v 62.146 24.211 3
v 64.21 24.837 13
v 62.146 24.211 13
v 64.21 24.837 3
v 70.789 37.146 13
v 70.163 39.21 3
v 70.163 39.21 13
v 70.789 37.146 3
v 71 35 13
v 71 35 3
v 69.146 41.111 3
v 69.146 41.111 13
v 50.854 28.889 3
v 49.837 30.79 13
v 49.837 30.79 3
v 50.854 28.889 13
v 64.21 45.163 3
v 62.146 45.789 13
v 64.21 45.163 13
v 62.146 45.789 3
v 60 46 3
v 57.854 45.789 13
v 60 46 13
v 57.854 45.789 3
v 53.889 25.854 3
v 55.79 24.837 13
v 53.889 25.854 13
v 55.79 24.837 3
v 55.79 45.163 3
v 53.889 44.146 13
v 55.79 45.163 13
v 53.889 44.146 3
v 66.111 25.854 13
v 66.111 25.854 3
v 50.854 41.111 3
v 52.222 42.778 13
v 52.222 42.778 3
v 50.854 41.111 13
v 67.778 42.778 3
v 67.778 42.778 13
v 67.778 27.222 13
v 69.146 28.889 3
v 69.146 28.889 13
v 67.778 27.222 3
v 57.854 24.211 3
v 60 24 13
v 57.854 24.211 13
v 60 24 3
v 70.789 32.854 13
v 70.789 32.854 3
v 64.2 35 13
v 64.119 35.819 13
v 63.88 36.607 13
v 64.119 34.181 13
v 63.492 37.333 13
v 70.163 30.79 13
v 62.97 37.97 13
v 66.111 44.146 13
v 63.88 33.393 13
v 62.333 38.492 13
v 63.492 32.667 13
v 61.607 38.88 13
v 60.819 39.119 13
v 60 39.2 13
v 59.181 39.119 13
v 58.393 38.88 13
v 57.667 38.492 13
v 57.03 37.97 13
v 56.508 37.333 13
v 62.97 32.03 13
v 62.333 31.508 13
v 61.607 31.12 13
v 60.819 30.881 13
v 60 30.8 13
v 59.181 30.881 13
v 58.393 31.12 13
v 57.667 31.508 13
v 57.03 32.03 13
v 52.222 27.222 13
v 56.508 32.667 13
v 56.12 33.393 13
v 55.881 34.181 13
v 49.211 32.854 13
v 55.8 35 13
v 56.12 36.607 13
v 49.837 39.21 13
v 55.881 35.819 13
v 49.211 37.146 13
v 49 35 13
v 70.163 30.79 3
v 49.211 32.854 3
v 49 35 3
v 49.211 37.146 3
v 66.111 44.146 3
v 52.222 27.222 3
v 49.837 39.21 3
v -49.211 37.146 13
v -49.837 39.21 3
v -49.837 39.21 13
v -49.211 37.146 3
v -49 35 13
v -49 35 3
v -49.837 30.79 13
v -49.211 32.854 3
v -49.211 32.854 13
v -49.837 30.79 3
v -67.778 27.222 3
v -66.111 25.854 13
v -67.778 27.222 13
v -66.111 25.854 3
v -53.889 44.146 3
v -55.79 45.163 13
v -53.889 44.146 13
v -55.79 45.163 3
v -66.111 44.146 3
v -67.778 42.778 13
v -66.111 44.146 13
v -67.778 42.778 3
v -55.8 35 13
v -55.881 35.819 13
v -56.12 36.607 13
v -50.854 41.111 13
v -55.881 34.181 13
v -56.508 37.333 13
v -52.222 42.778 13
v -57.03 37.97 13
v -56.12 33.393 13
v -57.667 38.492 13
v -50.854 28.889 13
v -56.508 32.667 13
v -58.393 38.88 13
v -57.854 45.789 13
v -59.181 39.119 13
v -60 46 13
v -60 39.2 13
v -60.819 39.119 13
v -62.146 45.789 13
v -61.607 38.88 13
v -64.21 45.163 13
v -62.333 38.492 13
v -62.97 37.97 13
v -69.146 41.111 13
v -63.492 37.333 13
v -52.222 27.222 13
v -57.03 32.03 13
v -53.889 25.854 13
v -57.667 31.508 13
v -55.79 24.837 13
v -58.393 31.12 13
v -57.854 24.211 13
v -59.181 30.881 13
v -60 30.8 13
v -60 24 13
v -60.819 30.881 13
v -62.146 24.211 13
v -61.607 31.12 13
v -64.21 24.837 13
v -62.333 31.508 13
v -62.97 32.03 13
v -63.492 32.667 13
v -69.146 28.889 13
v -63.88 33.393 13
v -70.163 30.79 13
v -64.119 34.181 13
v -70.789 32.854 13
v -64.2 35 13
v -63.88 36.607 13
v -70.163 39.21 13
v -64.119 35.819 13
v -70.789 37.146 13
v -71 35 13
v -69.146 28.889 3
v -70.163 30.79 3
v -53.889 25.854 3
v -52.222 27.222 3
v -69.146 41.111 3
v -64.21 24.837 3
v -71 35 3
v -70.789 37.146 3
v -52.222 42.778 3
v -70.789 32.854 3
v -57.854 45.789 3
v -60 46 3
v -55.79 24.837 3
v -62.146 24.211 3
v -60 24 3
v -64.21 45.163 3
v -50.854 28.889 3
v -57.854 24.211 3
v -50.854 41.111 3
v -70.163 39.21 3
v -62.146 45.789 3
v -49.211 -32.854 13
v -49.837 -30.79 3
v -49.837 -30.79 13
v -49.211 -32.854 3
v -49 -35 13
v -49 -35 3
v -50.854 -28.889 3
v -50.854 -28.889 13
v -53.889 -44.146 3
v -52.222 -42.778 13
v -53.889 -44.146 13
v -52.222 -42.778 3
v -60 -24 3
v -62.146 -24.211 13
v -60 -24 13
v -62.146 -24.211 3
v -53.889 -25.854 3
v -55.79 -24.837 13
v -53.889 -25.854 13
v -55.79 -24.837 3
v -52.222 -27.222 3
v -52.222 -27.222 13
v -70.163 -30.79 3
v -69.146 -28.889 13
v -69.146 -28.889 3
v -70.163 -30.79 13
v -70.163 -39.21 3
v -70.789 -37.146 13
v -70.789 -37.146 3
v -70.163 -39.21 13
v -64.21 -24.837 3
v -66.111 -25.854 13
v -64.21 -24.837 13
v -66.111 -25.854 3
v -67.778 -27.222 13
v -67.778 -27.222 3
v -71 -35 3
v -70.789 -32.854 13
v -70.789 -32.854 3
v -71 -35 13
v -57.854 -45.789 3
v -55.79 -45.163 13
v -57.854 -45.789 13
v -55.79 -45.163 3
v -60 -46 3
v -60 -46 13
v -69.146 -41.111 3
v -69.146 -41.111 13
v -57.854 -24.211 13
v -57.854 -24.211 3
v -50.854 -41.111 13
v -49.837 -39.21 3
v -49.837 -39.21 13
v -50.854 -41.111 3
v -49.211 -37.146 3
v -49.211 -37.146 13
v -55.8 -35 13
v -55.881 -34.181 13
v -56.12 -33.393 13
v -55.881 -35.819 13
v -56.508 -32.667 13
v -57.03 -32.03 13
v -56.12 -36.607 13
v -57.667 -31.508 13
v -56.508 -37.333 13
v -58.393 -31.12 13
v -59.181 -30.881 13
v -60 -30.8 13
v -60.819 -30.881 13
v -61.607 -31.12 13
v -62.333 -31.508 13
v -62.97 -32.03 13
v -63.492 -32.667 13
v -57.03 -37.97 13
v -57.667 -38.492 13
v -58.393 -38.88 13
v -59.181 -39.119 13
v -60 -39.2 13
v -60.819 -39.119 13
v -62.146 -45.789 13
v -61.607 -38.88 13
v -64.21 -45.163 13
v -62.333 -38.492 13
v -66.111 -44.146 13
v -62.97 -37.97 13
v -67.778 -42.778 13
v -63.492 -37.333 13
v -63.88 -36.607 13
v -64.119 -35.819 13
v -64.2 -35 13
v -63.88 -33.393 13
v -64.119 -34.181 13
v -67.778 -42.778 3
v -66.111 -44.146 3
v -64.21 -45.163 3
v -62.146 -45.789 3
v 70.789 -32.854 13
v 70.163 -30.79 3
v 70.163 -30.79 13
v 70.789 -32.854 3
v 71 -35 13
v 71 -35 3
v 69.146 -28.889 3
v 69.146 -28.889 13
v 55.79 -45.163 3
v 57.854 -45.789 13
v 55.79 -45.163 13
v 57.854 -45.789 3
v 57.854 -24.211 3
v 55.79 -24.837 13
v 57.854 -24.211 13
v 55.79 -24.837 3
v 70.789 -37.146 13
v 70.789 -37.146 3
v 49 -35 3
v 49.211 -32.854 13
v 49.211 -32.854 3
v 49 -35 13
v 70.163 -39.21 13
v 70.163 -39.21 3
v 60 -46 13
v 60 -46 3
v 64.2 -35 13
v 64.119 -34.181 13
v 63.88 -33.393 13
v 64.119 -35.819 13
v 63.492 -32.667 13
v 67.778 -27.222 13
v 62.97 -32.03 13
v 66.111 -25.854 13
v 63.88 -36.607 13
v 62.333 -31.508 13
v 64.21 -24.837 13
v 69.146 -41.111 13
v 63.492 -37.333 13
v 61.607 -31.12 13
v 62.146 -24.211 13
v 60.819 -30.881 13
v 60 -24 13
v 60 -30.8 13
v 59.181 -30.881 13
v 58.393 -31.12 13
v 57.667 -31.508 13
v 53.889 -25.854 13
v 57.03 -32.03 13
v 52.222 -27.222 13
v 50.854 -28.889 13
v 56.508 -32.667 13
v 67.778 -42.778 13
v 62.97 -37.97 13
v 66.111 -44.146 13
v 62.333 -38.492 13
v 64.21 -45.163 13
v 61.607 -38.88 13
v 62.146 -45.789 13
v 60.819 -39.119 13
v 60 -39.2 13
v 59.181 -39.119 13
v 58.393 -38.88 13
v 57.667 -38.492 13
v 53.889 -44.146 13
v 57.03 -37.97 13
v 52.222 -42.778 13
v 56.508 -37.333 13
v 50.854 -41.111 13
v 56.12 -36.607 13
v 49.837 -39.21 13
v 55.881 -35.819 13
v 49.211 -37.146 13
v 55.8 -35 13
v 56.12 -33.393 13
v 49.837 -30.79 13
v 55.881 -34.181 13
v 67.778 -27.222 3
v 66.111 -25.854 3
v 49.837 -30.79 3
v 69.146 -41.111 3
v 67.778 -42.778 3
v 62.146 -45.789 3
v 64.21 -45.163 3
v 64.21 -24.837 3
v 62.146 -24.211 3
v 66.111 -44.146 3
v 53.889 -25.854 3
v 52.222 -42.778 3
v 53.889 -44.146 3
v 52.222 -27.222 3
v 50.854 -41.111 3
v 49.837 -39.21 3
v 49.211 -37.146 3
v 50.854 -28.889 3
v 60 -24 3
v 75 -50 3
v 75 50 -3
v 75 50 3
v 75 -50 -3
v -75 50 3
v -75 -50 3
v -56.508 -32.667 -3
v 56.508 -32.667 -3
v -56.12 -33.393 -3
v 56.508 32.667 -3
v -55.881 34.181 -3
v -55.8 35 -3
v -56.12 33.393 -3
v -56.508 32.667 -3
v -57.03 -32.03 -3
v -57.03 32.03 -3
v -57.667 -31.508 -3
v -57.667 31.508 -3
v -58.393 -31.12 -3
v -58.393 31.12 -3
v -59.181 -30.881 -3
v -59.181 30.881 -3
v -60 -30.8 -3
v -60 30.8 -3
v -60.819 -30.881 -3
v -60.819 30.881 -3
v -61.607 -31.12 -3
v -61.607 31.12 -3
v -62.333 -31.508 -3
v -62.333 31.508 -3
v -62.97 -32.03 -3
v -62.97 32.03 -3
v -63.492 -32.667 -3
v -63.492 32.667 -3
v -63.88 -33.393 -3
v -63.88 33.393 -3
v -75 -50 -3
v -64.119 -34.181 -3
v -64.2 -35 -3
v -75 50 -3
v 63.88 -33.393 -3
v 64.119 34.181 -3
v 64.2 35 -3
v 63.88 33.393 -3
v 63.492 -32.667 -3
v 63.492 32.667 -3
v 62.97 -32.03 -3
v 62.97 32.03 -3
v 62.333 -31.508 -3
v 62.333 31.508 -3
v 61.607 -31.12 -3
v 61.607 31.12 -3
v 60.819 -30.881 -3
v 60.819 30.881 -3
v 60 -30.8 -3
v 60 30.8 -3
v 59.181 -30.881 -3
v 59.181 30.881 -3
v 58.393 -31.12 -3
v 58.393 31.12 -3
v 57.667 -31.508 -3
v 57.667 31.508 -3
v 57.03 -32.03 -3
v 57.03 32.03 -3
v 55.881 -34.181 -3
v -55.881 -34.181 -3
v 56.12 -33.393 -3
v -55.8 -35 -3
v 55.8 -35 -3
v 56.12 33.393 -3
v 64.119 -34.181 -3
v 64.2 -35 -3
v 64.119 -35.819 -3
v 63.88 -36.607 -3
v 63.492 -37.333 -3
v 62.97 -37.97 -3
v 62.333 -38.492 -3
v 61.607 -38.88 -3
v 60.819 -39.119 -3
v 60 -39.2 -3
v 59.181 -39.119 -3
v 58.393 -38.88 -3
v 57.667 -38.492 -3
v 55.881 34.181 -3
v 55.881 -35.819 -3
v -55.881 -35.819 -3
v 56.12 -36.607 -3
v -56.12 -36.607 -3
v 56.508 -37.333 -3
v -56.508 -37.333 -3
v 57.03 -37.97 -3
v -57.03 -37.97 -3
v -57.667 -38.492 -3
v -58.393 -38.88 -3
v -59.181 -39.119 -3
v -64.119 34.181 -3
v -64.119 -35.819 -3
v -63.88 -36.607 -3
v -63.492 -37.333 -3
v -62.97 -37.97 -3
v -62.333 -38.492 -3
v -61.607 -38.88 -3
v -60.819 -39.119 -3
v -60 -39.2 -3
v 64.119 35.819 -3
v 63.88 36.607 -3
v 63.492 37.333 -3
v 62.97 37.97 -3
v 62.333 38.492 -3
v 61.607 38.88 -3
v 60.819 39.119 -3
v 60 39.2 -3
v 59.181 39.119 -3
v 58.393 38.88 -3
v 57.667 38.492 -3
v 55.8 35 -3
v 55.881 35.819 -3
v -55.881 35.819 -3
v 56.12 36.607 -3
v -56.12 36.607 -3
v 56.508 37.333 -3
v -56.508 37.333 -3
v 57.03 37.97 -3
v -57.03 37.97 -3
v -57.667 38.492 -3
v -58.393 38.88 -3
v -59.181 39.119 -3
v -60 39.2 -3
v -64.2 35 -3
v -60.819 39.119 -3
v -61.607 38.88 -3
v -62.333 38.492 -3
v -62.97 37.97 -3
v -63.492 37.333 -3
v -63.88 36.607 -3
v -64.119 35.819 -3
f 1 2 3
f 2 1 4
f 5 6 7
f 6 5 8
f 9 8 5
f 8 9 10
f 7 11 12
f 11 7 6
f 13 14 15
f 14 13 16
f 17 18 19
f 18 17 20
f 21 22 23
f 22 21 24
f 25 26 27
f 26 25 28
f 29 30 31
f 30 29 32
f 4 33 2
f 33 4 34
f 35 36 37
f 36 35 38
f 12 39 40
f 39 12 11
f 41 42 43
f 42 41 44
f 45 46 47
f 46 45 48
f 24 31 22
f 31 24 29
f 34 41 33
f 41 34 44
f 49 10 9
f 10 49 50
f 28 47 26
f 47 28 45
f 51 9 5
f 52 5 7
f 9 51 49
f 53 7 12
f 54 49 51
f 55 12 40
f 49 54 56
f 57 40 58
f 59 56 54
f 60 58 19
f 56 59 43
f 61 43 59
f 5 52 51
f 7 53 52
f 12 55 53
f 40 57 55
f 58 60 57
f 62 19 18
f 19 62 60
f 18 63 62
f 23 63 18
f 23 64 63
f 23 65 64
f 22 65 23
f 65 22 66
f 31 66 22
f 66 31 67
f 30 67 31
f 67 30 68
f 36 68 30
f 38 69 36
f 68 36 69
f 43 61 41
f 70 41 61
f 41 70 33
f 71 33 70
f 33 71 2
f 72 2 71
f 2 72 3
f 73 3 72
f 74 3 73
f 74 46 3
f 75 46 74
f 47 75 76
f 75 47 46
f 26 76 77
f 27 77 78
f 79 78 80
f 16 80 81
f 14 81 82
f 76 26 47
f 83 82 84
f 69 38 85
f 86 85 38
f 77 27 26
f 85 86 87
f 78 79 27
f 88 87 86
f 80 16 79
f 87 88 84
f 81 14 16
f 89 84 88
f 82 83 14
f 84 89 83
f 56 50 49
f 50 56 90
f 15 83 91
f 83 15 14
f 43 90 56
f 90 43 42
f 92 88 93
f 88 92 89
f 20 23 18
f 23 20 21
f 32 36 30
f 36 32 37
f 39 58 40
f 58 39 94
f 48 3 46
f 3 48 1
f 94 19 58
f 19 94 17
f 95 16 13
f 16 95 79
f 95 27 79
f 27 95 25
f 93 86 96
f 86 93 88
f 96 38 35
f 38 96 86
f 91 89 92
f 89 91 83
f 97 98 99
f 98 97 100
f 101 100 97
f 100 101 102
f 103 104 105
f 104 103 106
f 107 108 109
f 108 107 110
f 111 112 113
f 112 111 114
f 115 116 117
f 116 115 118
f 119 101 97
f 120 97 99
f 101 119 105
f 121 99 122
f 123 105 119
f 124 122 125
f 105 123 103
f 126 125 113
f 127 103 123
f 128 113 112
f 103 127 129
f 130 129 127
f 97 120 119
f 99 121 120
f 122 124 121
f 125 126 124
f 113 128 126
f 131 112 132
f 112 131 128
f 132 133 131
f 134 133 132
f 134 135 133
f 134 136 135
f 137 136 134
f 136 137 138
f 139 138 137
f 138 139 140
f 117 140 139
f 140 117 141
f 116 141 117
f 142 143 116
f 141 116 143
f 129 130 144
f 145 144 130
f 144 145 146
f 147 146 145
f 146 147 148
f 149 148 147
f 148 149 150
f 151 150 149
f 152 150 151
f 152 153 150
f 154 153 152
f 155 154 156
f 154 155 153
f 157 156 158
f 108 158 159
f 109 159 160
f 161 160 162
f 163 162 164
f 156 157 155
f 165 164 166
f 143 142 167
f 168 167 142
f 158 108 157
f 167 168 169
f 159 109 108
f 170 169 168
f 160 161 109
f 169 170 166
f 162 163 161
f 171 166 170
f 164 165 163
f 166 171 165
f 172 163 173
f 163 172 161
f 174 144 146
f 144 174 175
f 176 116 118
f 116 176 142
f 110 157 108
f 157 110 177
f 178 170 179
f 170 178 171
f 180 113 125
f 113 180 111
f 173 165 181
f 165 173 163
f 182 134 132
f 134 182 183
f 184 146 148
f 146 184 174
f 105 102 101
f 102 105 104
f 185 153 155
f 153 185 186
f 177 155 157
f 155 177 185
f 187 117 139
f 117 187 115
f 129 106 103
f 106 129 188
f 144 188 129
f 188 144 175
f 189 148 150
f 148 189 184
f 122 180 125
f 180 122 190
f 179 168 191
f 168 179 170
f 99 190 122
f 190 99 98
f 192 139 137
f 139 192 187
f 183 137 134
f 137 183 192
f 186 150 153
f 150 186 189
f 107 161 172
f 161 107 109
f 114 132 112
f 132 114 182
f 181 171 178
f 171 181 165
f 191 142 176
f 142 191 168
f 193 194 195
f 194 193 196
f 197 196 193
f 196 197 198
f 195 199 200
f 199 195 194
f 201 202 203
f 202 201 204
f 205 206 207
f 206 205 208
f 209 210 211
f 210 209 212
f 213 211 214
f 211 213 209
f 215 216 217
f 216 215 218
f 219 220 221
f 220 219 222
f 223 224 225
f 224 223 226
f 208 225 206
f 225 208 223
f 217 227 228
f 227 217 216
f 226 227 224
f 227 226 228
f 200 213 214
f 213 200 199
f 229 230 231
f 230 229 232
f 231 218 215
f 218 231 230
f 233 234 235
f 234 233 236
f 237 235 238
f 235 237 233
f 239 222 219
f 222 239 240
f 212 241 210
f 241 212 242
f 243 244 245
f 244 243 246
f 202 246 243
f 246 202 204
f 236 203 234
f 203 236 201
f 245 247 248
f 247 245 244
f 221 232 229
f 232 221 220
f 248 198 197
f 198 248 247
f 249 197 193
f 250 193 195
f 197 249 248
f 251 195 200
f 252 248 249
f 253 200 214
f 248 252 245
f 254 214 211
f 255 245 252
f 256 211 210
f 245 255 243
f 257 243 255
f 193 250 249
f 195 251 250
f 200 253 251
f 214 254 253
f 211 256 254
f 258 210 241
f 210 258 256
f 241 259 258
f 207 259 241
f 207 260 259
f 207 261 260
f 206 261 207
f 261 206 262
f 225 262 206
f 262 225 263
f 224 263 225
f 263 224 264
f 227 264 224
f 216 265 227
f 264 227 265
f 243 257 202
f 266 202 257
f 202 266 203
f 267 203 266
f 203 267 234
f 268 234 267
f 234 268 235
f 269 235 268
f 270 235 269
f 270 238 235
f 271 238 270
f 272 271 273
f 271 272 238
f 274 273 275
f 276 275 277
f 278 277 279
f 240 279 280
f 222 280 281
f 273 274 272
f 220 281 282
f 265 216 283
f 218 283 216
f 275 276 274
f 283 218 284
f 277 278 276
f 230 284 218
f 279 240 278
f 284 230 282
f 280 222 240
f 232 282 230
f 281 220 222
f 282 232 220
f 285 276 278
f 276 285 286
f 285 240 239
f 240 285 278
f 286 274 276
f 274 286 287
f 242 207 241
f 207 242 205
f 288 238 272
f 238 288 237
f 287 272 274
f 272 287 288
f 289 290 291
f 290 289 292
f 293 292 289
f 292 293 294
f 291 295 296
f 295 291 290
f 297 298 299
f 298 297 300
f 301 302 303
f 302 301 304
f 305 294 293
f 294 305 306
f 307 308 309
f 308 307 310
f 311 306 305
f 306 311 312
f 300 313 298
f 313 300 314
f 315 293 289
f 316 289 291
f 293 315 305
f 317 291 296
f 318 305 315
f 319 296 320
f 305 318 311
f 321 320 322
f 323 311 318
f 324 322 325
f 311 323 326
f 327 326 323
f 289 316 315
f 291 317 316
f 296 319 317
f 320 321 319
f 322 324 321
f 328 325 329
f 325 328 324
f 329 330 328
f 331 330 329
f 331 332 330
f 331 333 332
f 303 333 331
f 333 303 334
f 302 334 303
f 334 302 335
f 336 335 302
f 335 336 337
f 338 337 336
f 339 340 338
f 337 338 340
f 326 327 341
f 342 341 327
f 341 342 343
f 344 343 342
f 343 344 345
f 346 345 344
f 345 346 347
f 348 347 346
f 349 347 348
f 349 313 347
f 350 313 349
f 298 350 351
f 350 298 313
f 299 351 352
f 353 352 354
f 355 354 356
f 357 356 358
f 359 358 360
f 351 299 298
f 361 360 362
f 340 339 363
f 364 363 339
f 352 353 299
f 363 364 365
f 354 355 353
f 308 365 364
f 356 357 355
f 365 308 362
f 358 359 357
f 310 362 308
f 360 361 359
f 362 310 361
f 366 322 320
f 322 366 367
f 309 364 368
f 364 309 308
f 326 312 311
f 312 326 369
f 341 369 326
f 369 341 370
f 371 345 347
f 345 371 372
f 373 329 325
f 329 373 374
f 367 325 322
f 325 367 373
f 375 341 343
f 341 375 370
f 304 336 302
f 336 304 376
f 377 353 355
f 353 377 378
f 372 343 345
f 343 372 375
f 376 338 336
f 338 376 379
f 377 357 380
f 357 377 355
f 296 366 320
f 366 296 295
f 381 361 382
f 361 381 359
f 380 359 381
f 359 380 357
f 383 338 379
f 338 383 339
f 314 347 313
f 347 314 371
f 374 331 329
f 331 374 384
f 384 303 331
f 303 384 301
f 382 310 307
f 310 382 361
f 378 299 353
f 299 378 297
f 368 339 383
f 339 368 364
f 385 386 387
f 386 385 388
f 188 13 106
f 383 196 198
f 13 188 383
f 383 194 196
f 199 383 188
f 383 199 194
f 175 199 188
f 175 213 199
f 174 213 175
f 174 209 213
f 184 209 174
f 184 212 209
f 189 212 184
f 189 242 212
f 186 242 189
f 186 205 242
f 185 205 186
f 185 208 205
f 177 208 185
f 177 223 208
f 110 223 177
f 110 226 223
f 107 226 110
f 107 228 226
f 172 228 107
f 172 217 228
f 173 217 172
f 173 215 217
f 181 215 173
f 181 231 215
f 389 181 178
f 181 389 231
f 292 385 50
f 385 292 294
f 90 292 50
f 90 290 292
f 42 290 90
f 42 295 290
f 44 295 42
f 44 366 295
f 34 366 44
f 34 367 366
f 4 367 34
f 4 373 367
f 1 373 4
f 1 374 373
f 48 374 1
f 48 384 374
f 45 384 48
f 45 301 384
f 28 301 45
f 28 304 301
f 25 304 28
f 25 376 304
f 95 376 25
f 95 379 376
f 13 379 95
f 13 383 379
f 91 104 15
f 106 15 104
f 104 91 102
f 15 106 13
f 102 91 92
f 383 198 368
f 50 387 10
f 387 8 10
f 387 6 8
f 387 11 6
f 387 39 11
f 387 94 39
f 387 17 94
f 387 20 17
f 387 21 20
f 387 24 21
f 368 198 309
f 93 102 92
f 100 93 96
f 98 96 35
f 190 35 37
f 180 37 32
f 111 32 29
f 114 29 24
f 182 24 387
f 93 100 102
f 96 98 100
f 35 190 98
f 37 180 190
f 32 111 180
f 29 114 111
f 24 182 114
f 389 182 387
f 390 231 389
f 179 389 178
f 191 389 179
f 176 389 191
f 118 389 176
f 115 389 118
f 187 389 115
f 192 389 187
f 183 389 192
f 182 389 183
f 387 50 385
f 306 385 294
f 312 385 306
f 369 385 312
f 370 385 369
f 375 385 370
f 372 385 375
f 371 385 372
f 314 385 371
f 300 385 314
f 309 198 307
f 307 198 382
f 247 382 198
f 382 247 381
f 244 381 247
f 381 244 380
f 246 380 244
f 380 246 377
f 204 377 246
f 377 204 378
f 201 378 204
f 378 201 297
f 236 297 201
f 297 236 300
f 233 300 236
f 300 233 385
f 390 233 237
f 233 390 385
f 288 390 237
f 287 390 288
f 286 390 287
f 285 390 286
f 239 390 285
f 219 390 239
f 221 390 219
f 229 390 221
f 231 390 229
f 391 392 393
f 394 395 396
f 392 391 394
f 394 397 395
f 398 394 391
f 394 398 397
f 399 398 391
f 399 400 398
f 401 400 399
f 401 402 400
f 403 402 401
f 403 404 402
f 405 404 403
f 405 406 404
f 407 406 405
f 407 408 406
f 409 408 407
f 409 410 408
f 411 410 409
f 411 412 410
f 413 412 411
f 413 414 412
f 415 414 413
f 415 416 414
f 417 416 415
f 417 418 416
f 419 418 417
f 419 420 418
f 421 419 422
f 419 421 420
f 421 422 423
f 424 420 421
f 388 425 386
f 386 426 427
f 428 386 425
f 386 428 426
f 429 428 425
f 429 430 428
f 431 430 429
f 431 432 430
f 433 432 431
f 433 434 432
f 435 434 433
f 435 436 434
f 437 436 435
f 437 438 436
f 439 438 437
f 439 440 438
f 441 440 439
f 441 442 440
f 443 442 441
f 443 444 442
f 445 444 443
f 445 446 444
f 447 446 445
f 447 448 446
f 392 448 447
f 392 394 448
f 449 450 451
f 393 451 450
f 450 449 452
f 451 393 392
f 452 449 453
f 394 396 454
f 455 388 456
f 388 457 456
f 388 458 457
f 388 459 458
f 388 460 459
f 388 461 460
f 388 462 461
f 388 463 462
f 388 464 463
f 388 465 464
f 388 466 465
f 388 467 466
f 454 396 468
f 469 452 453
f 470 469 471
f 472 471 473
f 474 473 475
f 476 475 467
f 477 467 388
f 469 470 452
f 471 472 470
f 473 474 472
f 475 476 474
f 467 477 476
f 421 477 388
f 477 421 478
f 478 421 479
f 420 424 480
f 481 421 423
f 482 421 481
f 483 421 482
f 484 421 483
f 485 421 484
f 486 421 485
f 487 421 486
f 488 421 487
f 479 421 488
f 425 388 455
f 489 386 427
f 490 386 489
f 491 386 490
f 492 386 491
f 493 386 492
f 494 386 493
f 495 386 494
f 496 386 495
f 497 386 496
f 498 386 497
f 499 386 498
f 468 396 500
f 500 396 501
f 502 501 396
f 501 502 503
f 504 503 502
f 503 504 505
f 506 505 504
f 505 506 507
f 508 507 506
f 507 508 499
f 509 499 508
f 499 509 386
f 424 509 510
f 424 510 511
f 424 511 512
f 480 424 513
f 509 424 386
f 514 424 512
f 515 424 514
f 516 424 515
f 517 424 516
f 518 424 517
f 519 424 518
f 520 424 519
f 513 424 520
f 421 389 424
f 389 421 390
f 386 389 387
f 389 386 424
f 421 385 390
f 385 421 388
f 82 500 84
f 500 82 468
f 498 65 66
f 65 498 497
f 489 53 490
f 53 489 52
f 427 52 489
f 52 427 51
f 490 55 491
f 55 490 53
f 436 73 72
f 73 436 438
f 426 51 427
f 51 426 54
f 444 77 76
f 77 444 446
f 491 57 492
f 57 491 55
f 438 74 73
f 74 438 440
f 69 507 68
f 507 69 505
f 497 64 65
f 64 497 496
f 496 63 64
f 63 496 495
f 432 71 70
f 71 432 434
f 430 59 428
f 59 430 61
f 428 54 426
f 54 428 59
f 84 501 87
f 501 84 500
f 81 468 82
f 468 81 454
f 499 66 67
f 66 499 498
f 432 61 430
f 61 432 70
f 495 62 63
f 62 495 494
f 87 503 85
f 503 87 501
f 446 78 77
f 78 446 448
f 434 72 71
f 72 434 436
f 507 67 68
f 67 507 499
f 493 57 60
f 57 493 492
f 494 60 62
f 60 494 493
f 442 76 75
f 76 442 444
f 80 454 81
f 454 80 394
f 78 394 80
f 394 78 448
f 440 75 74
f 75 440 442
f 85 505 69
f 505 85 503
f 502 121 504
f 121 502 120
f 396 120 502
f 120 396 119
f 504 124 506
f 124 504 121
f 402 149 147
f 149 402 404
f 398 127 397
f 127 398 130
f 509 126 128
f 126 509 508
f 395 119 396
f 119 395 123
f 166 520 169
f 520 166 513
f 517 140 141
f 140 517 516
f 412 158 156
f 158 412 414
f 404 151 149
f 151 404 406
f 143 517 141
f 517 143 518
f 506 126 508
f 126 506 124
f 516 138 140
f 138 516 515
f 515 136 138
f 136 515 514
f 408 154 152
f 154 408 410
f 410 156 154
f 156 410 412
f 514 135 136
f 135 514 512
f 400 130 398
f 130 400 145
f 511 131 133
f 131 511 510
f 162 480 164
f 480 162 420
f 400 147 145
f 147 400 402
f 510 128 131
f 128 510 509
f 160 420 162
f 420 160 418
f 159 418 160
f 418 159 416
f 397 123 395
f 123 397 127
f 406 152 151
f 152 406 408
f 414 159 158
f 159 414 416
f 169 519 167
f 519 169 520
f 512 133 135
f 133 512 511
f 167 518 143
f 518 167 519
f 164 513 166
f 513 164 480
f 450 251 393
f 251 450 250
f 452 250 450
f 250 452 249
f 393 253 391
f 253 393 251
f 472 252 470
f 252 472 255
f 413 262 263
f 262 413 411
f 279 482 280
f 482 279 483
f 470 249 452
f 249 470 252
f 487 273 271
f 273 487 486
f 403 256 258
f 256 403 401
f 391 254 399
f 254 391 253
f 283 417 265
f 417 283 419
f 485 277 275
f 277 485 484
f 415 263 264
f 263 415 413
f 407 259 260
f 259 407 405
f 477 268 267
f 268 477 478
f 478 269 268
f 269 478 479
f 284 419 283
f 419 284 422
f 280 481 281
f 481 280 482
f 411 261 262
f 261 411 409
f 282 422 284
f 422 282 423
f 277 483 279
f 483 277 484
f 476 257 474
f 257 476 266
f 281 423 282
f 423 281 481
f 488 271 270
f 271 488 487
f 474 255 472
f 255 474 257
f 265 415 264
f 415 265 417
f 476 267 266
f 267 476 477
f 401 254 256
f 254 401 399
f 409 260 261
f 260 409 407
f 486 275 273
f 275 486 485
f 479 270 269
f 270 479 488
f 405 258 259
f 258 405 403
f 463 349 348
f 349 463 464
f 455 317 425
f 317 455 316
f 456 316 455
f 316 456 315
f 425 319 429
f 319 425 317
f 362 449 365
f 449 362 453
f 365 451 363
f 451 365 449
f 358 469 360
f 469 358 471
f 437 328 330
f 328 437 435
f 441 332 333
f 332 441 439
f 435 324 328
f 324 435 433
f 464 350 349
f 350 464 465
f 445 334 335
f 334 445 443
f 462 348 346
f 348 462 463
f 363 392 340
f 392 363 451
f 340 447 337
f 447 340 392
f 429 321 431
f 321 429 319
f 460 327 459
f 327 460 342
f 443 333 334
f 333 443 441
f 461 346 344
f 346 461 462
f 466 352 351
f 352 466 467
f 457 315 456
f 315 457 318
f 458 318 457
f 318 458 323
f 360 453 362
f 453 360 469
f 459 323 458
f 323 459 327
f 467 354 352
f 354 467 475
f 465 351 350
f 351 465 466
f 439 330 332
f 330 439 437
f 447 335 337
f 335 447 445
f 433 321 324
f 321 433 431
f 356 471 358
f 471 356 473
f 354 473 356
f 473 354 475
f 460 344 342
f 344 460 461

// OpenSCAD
$fn = 32;

// ----------------------------------------------------------------------
// Anchor pads 150 x 100 x 16
// four corner bosses with anchor holes
// ----------------------------------------------------------------------

// --- parameters (mm) ---
plate = [150, 100, 6];  // base plate size (x, y, z)
pads = 4;               // boss count, one per corner
edge = 15;              // boss centre offset from the plate edge
boss_d = 22;            // boss diameter
boss_h = 10;            // boss height above the base plate
hole_d = 8.4;           // hole diameter

// --- derived feature positions (mm) ---
height = plate[2] + boss_h;      // = 16   overall height of the part
corner_x = plate[0] / 2 - edge;  // = 60   boss centre X
corner_y = plate[1] / 2 - edge;  // = 35   boss centre Y
feature_centers = [
  [corner_x, corner_y],
  [-corner_x, corner_y],
  [-corner_x, -corner_y],
  [corner_x, -corner_y]
];   // boss centres, anchor holes are drilled there

// base plate, four bosses standing on it, anchor holes all the way through
difference() {
  union() {
    cube(plate, center = true);
    for (centre = feature_centers)
      translate([centre[0], centre[1], plate[2] / 2 - 1])
        cylinder(d = boss_d, h = boss_h + 1);
  }
  for (centre = feature_centers)
    translate([centre[0], centre[1], -height])
      cylinder(d = hole_d, h = 2 * height + 2);  // through boss and plate
}
